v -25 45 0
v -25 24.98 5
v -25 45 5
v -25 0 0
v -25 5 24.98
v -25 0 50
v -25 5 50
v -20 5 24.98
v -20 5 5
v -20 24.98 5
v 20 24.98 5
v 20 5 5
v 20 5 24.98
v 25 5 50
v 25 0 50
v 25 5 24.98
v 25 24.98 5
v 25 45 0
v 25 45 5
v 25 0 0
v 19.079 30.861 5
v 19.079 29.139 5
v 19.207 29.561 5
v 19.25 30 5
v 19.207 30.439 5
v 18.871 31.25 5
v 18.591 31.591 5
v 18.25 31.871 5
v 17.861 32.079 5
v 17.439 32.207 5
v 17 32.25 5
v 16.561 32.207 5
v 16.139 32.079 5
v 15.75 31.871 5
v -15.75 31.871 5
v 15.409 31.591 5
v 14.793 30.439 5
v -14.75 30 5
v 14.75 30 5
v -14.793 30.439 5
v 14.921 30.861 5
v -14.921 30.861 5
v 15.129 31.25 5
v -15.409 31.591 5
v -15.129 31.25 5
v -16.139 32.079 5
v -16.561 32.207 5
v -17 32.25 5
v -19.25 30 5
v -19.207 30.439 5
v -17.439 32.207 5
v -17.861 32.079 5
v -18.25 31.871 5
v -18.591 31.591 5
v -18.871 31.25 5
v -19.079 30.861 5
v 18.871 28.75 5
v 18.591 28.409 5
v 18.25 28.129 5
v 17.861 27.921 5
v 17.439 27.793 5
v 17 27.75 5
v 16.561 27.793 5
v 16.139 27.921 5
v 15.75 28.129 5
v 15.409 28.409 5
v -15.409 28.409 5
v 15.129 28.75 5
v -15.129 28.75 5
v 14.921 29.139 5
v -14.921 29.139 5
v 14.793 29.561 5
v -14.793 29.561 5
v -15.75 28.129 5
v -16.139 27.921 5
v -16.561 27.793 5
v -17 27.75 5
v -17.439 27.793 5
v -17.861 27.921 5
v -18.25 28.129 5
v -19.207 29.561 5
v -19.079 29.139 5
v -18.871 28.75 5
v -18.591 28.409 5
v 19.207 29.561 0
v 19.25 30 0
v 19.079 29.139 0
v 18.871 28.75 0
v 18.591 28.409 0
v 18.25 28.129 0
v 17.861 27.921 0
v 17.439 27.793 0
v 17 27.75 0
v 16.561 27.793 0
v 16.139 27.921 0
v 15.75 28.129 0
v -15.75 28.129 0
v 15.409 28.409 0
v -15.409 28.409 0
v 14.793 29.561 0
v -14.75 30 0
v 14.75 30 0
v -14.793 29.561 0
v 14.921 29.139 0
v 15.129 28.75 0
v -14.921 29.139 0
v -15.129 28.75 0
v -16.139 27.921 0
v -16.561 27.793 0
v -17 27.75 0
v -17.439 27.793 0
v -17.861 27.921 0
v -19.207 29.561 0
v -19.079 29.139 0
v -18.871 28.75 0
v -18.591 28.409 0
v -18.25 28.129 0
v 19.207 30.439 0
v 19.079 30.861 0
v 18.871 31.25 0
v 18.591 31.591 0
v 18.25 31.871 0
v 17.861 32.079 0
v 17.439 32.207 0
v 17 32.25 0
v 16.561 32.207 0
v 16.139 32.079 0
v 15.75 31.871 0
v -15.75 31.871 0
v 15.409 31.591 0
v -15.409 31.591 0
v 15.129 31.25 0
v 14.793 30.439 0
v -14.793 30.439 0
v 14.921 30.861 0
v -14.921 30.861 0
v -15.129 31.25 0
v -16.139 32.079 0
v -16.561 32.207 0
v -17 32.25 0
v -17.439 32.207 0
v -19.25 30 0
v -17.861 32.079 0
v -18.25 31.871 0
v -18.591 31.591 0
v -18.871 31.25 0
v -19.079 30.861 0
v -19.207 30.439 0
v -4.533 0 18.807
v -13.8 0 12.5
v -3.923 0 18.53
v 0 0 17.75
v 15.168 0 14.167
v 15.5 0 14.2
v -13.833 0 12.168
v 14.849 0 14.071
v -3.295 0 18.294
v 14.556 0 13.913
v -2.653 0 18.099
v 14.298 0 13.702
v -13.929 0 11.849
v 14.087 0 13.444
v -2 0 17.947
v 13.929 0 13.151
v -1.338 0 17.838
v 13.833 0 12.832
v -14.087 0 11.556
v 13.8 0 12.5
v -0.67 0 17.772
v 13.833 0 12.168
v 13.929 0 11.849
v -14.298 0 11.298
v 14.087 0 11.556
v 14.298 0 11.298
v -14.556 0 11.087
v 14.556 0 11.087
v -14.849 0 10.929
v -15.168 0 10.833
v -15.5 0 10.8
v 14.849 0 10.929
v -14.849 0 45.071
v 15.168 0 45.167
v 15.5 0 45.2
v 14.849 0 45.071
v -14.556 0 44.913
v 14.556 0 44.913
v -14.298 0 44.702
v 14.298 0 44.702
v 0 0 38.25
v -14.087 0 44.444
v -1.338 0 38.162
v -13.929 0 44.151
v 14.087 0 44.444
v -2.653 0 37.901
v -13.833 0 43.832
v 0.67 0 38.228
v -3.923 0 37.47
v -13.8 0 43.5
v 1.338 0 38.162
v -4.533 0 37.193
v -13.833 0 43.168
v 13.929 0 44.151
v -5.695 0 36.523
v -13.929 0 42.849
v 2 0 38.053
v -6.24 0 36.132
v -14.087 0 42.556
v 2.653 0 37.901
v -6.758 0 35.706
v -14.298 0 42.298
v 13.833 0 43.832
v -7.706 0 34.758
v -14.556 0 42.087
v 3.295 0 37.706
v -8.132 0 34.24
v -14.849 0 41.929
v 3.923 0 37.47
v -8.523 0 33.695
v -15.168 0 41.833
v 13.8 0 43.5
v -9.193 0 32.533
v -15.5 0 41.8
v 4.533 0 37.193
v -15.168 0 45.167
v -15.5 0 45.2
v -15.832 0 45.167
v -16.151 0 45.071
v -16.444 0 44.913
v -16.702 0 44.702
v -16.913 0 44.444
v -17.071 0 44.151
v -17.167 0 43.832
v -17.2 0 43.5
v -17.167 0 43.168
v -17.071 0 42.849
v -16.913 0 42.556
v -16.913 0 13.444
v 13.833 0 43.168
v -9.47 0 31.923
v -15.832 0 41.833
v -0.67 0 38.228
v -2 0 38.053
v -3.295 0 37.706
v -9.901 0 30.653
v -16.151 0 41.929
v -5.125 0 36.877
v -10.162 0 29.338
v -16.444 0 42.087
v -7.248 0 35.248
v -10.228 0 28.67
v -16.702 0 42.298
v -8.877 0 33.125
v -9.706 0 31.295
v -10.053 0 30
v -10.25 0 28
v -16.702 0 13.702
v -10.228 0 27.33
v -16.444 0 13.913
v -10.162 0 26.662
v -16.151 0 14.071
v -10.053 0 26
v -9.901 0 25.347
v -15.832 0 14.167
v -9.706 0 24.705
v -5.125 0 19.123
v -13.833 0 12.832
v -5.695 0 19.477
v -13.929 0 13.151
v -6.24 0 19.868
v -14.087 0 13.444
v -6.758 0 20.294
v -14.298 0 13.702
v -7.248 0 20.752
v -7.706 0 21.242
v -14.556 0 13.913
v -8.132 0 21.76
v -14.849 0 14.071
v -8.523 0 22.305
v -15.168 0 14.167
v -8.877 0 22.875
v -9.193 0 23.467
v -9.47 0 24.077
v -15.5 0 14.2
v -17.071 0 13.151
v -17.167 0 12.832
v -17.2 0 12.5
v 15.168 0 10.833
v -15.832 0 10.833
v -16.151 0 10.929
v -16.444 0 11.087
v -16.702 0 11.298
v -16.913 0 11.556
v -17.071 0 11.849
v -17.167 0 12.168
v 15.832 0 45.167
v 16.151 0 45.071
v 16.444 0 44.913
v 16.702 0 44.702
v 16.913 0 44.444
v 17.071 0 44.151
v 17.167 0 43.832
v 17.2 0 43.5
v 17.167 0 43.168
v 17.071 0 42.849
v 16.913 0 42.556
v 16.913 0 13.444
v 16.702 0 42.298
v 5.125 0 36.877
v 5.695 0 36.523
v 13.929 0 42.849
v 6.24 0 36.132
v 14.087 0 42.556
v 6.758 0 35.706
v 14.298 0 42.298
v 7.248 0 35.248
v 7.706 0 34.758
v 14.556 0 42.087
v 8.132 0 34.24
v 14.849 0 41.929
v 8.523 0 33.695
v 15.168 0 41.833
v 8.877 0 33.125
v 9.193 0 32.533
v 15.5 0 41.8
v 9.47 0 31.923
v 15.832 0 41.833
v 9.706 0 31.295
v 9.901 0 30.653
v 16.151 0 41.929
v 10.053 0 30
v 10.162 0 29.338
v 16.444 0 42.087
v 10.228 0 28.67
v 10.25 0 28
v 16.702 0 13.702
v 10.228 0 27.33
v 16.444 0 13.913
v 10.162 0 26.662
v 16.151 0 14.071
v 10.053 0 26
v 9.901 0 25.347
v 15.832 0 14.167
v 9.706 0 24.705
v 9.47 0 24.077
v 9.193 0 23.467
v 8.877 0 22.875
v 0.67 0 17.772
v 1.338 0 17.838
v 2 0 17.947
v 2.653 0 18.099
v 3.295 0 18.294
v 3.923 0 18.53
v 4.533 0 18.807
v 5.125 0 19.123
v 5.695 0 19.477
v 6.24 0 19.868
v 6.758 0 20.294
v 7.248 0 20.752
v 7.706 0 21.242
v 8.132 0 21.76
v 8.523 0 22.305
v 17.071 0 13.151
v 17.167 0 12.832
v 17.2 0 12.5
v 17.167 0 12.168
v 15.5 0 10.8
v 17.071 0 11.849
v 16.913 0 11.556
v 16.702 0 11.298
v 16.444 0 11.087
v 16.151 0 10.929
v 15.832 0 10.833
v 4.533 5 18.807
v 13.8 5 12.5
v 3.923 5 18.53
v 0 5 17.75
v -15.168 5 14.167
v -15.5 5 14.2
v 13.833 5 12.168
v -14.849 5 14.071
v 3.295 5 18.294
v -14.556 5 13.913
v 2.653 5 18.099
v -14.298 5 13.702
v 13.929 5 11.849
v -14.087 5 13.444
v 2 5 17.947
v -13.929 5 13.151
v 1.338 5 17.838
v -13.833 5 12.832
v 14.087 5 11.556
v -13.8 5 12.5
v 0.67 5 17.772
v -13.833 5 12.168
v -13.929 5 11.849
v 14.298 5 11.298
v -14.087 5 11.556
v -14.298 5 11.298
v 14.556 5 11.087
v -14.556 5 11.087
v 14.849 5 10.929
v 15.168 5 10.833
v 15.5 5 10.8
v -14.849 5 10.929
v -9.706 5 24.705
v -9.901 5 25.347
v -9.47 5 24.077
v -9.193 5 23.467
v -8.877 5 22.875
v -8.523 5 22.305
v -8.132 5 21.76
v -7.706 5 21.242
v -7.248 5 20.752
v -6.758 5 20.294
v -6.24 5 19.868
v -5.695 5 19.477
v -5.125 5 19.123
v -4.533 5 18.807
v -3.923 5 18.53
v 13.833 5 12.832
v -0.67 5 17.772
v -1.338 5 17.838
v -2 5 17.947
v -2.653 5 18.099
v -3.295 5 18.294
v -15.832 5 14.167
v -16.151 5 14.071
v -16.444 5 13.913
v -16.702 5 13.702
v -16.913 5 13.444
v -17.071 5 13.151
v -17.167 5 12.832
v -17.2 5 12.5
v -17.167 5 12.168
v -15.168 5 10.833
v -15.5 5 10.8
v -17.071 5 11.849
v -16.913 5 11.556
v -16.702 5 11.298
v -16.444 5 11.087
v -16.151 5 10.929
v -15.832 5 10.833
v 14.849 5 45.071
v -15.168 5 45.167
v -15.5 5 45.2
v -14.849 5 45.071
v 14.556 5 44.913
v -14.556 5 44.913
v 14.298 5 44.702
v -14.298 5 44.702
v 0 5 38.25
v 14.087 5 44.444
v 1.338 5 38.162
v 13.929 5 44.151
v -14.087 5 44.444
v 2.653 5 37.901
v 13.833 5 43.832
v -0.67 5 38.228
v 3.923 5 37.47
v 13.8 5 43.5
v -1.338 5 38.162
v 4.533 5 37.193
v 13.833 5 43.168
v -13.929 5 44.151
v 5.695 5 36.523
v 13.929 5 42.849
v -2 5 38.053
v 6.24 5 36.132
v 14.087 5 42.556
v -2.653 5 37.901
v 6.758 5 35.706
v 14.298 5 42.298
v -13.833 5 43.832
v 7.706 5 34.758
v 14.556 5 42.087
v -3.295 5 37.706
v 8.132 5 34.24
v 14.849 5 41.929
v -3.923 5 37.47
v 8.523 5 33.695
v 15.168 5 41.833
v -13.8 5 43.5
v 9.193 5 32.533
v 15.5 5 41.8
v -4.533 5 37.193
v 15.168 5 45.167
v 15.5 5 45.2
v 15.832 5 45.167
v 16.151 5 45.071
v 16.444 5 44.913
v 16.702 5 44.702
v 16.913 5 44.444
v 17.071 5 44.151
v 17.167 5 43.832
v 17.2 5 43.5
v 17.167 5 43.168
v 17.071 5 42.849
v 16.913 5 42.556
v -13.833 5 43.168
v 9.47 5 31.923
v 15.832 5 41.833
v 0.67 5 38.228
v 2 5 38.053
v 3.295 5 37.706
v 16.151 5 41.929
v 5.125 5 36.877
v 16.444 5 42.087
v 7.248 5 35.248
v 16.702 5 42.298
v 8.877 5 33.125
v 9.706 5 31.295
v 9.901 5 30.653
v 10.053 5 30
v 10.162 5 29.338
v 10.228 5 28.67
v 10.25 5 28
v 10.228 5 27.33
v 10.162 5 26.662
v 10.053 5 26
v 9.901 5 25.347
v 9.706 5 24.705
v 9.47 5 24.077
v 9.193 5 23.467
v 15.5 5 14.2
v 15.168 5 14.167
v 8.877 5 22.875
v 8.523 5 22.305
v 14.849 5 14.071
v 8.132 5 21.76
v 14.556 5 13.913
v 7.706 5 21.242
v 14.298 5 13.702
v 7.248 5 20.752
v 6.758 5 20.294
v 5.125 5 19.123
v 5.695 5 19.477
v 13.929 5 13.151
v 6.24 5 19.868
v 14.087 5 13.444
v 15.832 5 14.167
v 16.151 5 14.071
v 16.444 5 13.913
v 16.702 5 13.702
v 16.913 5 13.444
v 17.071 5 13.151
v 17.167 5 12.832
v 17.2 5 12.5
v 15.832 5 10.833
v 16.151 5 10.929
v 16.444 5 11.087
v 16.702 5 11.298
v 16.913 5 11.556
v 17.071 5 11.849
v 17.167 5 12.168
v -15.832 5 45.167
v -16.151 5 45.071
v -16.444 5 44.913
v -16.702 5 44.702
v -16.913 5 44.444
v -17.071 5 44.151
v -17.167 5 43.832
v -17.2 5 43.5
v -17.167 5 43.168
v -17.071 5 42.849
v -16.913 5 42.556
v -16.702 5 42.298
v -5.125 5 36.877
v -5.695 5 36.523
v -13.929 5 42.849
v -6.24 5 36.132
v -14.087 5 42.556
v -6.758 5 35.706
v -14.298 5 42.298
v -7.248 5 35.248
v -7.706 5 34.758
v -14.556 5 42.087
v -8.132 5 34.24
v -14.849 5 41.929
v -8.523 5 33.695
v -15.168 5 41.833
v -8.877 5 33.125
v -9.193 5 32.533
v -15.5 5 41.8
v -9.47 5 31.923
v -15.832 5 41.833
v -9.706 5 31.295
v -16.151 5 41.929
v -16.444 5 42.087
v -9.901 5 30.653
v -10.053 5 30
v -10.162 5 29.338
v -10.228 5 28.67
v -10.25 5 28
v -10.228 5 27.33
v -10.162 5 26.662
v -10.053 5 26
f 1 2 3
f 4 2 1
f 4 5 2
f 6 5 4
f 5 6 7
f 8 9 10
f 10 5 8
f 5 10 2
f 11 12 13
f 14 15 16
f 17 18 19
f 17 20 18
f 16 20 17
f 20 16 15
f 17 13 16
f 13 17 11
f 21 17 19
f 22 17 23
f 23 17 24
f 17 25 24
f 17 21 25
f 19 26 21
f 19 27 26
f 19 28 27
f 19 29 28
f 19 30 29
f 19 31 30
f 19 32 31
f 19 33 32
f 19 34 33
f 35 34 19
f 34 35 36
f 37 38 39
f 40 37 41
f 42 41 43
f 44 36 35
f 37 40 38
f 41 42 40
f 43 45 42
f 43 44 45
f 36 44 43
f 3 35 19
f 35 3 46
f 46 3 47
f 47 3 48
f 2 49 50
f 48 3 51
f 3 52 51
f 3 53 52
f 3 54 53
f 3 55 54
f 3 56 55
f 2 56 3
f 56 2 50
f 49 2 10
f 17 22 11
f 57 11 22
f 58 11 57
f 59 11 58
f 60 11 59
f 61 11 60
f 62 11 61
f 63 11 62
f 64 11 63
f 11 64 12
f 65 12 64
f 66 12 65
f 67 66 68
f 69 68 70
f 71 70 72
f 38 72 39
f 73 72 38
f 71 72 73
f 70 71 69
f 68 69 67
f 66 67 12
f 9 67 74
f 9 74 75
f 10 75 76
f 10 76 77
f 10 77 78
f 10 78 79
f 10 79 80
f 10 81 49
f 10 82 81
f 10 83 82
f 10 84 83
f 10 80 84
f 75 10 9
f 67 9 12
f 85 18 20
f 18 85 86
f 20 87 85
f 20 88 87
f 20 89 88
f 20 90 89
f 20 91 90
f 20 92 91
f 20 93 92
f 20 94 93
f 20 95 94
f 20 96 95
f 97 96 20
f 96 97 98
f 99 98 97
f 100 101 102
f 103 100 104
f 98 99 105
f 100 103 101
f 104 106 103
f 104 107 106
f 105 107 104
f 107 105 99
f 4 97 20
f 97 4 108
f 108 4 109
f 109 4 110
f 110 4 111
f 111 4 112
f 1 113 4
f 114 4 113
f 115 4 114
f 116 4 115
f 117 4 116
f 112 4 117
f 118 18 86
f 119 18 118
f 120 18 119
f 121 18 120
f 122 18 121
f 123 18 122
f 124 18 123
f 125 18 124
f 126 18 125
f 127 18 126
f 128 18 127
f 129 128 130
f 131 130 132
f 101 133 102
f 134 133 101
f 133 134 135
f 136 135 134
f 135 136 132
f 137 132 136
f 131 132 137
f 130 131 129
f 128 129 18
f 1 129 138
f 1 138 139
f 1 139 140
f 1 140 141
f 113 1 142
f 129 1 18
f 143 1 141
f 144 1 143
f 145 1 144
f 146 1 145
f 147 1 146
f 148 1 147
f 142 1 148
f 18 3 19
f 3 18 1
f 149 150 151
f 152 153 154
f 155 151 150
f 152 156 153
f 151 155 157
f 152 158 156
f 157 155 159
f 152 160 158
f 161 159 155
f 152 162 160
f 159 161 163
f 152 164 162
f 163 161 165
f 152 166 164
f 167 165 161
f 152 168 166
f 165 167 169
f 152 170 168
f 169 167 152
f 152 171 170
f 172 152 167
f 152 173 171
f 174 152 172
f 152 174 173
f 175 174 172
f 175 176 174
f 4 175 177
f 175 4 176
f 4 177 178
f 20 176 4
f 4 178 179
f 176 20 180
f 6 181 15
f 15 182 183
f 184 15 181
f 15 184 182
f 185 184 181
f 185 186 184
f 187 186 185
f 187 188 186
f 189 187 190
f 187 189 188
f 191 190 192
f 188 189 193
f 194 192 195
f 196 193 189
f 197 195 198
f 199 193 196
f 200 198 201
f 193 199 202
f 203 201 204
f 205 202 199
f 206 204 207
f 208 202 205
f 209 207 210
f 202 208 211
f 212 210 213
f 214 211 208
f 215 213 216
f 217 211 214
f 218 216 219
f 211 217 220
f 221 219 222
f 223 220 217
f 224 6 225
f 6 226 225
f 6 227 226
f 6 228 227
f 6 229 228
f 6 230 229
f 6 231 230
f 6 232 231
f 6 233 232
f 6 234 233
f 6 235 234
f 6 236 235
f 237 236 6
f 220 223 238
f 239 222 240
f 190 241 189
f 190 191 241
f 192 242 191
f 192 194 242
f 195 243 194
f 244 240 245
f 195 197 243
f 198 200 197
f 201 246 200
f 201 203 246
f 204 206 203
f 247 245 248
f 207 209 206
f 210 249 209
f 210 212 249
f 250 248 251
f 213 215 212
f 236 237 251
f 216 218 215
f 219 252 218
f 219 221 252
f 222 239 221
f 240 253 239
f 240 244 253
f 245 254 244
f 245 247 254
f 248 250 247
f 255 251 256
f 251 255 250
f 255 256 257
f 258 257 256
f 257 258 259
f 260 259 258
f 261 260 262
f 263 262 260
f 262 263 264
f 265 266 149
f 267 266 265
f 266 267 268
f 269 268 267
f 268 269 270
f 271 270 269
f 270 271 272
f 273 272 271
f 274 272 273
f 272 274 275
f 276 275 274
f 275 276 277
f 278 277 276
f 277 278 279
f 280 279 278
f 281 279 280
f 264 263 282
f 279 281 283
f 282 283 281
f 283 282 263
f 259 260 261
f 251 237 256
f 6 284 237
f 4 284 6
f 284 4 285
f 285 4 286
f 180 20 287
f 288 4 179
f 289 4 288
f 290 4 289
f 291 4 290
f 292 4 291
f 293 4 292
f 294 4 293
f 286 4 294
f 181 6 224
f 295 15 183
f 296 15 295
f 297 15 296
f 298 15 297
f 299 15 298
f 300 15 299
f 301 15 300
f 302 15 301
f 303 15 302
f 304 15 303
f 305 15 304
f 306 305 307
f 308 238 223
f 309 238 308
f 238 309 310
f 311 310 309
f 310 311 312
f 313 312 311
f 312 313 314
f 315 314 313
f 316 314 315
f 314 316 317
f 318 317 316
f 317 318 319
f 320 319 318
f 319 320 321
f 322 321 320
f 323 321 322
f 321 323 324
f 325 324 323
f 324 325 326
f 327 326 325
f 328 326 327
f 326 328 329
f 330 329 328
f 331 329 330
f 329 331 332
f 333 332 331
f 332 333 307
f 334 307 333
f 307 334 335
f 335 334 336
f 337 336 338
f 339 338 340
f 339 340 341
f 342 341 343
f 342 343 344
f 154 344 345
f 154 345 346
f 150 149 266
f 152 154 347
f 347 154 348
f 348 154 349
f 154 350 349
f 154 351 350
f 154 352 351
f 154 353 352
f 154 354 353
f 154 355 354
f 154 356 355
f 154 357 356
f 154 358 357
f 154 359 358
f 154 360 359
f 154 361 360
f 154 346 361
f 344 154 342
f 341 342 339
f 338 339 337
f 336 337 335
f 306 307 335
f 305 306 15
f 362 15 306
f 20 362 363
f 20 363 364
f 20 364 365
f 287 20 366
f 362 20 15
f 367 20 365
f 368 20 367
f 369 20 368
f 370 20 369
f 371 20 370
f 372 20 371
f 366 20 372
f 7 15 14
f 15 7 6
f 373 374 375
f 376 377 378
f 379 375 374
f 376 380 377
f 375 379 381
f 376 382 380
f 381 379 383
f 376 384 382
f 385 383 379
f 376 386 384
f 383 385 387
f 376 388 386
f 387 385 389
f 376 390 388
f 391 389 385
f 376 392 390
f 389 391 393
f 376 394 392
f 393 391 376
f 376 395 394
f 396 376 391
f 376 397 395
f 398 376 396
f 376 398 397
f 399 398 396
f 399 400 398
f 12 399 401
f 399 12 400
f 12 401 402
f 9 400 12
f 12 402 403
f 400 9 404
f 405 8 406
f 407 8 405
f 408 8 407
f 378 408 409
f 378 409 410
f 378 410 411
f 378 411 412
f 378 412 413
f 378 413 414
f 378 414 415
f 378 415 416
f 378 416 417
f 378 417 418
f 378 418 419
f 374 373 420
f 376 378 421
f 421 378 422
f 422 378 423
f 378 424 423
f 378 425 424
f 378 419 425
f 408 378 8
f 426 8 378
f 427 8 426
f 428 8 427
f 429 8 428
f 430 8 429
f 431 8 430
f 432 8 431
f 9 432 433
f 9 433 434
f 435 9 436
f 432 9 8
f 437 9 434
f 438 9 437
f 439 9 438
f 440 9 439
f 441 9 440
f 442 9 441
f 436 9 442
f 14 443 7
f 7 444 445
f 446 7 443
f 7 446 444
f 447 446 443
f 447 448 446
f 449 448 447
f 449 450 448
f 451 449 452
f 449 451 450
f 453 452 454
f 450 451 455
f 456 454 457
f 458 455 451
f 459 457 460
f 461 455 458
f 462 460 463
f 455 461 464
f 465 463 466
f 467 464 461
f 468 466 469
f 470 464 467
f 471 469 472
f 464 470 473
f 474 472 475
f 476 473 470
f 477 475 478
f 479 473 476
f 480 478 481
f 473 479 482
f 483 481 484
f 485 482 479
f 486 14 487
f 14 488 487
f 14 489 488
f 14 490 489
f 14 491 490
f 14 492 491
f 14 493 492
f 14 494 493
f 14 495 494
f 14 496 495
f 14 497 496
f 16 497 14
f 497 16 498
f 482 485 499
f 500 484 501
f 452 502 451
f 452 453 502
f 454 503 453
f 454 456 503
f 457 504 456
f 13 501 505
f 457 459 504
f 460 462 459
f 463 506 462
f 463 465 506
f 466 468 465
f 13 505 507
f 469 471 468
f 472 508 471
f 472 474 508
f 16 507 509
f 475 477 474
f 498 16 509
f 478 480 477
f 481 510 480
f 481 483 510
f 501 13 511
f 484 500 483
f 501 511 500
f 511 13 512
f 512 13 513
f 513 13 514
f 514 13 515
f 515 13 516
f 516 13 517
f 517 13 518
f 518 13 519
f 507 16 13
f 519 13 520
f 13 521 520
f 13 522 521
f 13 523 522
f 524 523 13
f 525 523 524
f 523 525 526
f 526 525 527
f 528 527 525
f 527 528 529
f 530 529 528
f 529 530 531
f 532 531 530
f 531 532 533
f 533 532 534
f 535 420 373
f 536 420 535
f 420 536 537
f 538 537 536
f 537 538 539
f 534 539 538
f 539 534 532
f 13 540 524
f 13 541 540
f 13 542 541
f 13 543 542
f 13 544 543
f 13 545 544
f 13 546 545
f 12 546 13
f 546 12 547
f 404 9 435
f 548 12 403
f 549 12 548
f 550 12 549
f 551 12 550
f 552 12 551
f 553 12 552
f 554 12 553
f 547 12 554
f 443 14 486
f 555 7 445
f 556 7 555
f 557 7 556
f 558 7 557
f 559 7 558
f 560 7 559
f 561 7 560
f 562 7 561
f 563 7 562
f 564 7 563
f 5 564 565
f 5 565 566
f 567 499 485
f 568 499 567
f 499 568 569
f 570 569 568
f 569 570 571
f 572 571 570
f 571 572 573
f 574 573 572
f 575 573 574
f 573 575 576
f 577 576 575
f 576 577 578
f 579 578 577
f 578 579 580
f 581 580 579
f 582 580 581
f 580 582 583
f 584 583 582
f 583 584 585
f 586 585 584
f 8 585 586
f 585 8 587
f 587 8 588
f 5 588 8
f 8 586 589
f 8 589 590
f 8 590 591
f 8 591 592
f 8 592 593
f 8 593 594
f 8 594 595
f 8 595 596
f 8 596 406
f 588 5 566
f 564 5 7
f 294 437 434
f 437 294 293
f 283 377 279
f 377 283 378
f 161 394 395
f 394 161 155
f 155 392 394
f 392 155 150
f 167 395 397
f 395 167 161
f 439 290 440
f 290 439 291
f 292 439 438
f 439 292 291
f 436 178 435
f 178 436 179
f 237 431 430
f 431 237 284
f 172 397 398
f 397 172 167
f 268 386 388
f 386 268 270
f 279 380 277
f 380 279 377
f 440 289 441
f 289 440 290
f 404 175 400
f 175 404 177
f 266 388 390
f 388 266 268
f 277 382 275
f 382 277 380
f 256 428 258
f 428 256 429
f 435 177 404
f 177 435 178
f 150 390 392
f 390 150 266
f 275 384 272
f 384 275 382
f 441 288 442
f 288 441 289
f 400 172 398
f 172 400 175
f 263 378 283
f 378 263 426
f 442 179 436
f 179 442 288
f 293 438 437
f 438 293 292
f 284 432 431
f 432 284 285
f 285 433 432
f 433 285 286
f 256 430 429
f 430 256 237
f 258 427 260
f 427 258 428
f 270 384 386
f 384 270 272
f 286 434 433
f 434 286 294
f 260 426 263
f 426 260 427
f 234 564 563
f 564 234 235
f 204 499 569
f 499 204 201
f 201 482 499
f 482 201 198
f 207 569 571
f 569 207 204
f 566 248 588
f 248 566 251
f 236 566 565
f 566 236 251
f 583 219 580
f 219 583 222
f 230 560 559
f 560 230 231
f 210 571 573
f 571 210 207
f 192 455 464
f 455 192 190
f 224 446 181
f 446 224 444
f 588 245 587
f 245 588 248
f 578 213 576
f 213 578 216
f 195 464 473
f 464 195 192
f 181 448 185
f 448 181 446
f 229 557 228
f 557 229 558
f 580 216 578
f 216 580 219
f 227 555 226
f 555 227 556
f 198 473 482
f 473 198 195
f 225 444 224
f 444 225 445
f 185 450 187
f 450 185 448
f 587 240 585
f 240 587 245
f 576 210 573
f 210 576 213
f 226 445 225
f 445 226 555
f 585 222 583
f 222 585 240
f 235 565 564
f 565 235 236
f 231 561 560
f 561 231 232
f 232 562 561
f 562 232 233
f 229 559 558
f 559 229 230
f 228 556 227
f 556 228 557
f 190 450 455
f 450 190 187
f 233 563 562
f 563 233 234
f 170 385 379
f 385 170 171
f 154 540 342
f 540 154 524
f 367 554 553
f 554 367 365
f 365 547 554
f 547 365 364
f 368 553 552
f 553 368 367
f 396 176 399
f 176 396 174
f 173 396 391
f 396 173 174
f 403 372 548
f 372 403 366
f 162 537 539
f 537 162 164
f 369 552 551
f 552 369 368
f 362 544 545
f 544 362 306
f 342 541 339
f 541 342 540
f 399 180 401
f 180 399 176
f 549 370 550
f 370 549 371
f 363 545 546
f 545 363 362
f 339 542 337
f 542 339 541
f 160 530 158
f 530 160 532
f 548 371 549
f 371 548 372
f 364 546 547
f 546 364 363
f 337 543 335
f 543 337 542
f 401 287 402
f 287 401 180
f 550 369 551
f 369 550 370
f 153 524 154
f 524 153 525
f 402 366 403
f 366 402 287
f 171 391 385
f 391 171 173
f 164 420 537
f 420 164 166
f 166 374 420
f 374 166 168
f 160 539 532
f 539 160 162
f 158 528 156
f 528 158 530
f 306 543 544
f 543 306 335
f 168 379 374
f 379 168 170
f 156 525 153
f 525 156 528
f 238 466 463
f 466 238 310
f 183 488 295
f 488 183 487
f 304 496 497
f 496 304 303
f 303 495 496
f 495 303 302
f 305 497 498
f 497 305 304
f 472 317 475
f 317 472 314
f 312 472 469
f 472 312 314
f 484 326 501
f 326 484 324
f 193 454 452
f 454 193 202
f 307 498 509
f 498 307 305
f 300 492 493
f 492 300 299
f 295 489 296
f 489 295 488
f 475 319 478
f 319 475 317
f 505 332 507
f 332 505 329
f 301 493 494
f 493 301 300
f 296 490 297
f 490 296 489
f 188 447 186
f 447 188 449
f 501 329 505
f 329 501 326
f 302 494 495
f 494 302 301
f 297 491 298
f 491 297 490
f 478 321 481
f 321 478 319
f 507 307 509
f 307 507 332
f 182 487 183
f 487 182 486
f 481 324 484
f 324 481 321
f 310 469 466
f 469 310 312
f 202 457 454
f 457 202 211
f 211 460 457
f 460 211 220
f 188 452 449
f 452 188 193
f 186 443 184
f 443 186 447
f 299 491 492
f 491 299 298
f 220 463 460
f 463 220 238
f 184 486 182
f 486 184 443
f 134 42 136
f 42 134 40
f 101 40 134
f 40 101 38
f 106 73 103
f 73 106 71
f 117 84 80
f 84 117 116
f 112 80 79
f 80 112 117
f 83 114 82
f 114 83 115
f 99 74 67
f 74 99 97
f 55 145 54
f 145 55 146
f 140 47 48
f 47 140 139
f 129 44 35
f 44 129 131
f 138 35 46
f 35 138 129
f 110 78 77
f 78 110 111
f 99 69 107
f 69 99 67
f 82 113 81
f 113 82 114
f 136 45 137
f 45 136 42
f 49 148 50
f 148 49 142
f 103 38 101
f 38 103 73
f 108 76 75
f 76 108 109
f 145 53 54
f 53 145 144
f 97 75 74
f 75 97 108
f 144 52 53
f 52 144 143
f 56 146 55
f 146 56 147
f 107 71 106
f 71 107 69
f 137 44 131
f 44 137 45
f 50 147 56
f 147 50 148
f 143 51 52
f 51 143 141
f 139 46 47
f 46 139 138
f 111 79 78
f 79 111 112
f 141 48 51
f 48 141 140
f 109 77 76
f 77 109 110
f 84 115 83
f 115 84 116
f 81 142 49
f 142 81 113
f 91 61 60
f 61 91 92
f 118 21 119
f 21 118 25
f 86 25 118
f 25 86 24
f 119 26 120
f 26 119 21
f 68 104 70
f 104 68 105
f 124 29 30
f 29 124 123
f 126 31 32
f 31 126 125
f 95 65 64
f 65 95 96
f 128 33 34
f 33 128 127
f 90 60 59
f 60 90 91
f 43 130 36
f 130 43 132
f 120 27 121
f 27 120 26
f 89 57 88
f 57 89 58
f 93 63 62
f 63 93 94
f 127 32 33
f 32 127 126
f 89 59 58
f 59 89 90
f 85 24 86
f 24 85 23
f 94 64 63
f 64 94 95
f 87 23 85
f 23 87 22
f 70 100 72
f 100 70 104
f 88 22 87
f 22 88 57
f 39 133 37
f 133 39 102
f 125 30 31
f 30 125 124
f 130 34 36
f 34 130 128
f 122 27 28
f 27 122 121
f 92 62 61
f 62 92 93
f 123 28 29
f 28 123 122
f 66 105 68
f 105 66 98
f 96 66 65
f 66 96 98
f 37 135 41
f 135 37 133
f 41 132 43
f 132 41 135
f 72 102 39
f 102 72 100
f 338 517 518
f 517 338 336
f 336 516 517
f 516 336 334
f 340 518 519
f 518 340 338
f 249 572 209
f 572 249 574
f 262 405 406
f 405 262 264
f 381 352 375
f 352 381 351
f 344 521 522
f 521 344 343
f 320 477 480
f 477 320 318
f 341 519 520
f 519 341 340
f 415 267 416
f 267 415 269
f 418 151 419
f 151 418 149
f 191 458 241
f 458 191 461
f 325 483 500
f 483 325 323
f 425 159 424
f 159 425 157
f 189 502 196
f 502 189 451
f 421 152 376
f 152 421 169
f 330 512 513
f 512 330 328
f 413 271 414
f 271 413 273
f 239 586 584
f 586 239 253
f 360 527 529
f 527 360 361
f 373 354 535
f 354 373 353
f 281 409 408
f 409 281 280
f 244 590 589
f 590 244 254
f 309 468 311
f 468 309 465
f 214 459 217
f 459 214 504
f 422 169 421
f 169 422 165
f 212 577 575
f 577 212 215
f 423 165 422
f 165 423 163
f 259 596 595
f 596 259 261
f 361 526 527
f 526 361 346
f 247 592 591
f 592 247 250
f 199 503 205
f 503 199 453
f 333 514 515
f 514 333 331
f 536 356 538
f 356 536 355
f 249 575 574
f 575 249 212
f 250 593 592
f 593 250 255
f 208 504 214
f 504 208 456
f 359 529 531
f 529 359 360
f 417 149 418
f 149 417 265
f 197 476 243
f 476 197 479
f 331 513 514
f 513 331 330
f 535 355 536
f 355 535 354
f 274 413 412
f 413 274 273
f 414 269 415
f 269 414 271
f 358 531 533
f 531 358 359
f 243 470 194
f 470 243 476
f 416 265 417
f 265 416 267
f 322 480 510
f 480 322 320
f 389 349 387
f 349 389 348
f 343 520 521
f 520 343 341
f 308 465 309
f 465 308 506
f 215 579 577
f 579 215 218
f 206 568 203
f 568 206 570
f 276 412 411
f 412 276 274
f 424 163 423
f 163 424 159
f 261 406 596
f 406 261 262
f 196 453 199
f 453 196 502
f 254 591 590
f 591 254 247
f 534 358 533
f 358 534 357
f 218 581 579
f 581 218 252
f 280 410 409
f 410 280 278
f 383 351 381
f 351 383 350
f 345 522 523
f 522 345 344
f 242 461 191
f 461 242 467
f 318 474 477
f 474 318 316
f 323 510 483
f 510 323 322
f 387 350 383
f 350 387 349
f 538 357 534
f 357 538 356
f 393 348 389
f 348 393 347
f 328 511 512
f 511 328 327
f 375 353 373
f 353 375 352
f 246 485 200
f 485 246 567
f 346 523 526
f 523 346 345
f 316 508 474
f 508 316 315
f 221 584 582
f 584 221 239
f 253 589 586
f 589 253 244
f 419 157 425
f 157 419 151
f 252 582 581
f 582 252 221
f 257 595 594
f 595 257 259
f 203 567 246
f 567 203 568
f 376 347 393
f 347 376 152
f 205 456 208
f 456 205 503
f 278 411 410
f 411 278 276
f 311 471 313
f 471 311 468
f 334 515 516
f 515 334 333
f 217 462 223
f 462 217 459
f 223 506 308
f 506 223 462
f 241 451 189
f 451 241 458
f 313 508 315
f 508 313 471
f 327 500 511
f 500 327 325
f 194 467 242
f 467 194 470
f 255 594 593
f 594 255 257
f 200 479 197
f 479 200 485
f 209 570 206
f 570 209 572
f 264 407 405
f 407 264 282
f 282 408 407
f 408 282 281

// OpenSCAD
// L-bracket for a NEMA 17 stepper motor (syringe pumps, peristaltic pumps, shakers)
// Category: full hardware. Base plate with two M4 holes, vertical motor plate with
// the 22 mm boss hole + 31 mm M3 pattern, two gussets. Motor body mounts on the
// back (-Y) side, shaft pointing over the base.
// Print: PETG, base on the bed, 0.2 mm layers, 5 perimeters, 30 % infill.
// SPDX-License-Identifier: CERN-OHL-P-2.0

/* [Bracket] */
base = [50, 45, 5];      // X, Y, Z: spans y = 0..45
plate = [50, 5, 50];     // vertical plate at y = 0..5
boss_d = 20.5;             // NEMA 17 centring boss is 22 mm
boss_z = 28;             // motor axis height
screw_d = 3.4;           // M3 clearance
screw_spacing = 31;      // NEMA 17 bolt pattern
mount_d = 4.5;           // M4 clearance
mount_pos = [[-17, 30], [17, 30]];
gusset_t = 5;
gusset_len = 20;

/* [Hidden] */
eps = 0.01;

difference() {
    union() {
        translate([-base.x / 2, 0, 0]) cube(base);
        translate([-plate.x / 2, 0, 0]) cube(plate);
        for (sx = [-1, 1])
            translate([sx * (base.x / 2 - gusset_t / 2) - gusset_t / 2, plate.y - eps, base.z - eps])
                rotate([90, 0, 90]) linear_extrude(gusset_t)
                    polygon([[0, 0], [gusset_len, 0], [0, gusset_len]]);
    }
    translate([0, -1, boss_z]) rotate([-90, 0, 0]) cylinder(d = boss_d, h = plate.y + 2, $fn = 96);
    for (sx = [-1, 1], sz = [-1, 1])
        translate([sx * screw_spacing / 2, -1, boss_z + sz * screw_spacing / 2])
            rotate([-90, 0, 0]) cylinder(d = screw_d, h = plate.y + 2, $fn = 32);
    for (p = mount_pos)
        translate([p.x, p.y, -1]) cylinder(d = mount_d, h = base.z + 2, $fn = 32);
}
